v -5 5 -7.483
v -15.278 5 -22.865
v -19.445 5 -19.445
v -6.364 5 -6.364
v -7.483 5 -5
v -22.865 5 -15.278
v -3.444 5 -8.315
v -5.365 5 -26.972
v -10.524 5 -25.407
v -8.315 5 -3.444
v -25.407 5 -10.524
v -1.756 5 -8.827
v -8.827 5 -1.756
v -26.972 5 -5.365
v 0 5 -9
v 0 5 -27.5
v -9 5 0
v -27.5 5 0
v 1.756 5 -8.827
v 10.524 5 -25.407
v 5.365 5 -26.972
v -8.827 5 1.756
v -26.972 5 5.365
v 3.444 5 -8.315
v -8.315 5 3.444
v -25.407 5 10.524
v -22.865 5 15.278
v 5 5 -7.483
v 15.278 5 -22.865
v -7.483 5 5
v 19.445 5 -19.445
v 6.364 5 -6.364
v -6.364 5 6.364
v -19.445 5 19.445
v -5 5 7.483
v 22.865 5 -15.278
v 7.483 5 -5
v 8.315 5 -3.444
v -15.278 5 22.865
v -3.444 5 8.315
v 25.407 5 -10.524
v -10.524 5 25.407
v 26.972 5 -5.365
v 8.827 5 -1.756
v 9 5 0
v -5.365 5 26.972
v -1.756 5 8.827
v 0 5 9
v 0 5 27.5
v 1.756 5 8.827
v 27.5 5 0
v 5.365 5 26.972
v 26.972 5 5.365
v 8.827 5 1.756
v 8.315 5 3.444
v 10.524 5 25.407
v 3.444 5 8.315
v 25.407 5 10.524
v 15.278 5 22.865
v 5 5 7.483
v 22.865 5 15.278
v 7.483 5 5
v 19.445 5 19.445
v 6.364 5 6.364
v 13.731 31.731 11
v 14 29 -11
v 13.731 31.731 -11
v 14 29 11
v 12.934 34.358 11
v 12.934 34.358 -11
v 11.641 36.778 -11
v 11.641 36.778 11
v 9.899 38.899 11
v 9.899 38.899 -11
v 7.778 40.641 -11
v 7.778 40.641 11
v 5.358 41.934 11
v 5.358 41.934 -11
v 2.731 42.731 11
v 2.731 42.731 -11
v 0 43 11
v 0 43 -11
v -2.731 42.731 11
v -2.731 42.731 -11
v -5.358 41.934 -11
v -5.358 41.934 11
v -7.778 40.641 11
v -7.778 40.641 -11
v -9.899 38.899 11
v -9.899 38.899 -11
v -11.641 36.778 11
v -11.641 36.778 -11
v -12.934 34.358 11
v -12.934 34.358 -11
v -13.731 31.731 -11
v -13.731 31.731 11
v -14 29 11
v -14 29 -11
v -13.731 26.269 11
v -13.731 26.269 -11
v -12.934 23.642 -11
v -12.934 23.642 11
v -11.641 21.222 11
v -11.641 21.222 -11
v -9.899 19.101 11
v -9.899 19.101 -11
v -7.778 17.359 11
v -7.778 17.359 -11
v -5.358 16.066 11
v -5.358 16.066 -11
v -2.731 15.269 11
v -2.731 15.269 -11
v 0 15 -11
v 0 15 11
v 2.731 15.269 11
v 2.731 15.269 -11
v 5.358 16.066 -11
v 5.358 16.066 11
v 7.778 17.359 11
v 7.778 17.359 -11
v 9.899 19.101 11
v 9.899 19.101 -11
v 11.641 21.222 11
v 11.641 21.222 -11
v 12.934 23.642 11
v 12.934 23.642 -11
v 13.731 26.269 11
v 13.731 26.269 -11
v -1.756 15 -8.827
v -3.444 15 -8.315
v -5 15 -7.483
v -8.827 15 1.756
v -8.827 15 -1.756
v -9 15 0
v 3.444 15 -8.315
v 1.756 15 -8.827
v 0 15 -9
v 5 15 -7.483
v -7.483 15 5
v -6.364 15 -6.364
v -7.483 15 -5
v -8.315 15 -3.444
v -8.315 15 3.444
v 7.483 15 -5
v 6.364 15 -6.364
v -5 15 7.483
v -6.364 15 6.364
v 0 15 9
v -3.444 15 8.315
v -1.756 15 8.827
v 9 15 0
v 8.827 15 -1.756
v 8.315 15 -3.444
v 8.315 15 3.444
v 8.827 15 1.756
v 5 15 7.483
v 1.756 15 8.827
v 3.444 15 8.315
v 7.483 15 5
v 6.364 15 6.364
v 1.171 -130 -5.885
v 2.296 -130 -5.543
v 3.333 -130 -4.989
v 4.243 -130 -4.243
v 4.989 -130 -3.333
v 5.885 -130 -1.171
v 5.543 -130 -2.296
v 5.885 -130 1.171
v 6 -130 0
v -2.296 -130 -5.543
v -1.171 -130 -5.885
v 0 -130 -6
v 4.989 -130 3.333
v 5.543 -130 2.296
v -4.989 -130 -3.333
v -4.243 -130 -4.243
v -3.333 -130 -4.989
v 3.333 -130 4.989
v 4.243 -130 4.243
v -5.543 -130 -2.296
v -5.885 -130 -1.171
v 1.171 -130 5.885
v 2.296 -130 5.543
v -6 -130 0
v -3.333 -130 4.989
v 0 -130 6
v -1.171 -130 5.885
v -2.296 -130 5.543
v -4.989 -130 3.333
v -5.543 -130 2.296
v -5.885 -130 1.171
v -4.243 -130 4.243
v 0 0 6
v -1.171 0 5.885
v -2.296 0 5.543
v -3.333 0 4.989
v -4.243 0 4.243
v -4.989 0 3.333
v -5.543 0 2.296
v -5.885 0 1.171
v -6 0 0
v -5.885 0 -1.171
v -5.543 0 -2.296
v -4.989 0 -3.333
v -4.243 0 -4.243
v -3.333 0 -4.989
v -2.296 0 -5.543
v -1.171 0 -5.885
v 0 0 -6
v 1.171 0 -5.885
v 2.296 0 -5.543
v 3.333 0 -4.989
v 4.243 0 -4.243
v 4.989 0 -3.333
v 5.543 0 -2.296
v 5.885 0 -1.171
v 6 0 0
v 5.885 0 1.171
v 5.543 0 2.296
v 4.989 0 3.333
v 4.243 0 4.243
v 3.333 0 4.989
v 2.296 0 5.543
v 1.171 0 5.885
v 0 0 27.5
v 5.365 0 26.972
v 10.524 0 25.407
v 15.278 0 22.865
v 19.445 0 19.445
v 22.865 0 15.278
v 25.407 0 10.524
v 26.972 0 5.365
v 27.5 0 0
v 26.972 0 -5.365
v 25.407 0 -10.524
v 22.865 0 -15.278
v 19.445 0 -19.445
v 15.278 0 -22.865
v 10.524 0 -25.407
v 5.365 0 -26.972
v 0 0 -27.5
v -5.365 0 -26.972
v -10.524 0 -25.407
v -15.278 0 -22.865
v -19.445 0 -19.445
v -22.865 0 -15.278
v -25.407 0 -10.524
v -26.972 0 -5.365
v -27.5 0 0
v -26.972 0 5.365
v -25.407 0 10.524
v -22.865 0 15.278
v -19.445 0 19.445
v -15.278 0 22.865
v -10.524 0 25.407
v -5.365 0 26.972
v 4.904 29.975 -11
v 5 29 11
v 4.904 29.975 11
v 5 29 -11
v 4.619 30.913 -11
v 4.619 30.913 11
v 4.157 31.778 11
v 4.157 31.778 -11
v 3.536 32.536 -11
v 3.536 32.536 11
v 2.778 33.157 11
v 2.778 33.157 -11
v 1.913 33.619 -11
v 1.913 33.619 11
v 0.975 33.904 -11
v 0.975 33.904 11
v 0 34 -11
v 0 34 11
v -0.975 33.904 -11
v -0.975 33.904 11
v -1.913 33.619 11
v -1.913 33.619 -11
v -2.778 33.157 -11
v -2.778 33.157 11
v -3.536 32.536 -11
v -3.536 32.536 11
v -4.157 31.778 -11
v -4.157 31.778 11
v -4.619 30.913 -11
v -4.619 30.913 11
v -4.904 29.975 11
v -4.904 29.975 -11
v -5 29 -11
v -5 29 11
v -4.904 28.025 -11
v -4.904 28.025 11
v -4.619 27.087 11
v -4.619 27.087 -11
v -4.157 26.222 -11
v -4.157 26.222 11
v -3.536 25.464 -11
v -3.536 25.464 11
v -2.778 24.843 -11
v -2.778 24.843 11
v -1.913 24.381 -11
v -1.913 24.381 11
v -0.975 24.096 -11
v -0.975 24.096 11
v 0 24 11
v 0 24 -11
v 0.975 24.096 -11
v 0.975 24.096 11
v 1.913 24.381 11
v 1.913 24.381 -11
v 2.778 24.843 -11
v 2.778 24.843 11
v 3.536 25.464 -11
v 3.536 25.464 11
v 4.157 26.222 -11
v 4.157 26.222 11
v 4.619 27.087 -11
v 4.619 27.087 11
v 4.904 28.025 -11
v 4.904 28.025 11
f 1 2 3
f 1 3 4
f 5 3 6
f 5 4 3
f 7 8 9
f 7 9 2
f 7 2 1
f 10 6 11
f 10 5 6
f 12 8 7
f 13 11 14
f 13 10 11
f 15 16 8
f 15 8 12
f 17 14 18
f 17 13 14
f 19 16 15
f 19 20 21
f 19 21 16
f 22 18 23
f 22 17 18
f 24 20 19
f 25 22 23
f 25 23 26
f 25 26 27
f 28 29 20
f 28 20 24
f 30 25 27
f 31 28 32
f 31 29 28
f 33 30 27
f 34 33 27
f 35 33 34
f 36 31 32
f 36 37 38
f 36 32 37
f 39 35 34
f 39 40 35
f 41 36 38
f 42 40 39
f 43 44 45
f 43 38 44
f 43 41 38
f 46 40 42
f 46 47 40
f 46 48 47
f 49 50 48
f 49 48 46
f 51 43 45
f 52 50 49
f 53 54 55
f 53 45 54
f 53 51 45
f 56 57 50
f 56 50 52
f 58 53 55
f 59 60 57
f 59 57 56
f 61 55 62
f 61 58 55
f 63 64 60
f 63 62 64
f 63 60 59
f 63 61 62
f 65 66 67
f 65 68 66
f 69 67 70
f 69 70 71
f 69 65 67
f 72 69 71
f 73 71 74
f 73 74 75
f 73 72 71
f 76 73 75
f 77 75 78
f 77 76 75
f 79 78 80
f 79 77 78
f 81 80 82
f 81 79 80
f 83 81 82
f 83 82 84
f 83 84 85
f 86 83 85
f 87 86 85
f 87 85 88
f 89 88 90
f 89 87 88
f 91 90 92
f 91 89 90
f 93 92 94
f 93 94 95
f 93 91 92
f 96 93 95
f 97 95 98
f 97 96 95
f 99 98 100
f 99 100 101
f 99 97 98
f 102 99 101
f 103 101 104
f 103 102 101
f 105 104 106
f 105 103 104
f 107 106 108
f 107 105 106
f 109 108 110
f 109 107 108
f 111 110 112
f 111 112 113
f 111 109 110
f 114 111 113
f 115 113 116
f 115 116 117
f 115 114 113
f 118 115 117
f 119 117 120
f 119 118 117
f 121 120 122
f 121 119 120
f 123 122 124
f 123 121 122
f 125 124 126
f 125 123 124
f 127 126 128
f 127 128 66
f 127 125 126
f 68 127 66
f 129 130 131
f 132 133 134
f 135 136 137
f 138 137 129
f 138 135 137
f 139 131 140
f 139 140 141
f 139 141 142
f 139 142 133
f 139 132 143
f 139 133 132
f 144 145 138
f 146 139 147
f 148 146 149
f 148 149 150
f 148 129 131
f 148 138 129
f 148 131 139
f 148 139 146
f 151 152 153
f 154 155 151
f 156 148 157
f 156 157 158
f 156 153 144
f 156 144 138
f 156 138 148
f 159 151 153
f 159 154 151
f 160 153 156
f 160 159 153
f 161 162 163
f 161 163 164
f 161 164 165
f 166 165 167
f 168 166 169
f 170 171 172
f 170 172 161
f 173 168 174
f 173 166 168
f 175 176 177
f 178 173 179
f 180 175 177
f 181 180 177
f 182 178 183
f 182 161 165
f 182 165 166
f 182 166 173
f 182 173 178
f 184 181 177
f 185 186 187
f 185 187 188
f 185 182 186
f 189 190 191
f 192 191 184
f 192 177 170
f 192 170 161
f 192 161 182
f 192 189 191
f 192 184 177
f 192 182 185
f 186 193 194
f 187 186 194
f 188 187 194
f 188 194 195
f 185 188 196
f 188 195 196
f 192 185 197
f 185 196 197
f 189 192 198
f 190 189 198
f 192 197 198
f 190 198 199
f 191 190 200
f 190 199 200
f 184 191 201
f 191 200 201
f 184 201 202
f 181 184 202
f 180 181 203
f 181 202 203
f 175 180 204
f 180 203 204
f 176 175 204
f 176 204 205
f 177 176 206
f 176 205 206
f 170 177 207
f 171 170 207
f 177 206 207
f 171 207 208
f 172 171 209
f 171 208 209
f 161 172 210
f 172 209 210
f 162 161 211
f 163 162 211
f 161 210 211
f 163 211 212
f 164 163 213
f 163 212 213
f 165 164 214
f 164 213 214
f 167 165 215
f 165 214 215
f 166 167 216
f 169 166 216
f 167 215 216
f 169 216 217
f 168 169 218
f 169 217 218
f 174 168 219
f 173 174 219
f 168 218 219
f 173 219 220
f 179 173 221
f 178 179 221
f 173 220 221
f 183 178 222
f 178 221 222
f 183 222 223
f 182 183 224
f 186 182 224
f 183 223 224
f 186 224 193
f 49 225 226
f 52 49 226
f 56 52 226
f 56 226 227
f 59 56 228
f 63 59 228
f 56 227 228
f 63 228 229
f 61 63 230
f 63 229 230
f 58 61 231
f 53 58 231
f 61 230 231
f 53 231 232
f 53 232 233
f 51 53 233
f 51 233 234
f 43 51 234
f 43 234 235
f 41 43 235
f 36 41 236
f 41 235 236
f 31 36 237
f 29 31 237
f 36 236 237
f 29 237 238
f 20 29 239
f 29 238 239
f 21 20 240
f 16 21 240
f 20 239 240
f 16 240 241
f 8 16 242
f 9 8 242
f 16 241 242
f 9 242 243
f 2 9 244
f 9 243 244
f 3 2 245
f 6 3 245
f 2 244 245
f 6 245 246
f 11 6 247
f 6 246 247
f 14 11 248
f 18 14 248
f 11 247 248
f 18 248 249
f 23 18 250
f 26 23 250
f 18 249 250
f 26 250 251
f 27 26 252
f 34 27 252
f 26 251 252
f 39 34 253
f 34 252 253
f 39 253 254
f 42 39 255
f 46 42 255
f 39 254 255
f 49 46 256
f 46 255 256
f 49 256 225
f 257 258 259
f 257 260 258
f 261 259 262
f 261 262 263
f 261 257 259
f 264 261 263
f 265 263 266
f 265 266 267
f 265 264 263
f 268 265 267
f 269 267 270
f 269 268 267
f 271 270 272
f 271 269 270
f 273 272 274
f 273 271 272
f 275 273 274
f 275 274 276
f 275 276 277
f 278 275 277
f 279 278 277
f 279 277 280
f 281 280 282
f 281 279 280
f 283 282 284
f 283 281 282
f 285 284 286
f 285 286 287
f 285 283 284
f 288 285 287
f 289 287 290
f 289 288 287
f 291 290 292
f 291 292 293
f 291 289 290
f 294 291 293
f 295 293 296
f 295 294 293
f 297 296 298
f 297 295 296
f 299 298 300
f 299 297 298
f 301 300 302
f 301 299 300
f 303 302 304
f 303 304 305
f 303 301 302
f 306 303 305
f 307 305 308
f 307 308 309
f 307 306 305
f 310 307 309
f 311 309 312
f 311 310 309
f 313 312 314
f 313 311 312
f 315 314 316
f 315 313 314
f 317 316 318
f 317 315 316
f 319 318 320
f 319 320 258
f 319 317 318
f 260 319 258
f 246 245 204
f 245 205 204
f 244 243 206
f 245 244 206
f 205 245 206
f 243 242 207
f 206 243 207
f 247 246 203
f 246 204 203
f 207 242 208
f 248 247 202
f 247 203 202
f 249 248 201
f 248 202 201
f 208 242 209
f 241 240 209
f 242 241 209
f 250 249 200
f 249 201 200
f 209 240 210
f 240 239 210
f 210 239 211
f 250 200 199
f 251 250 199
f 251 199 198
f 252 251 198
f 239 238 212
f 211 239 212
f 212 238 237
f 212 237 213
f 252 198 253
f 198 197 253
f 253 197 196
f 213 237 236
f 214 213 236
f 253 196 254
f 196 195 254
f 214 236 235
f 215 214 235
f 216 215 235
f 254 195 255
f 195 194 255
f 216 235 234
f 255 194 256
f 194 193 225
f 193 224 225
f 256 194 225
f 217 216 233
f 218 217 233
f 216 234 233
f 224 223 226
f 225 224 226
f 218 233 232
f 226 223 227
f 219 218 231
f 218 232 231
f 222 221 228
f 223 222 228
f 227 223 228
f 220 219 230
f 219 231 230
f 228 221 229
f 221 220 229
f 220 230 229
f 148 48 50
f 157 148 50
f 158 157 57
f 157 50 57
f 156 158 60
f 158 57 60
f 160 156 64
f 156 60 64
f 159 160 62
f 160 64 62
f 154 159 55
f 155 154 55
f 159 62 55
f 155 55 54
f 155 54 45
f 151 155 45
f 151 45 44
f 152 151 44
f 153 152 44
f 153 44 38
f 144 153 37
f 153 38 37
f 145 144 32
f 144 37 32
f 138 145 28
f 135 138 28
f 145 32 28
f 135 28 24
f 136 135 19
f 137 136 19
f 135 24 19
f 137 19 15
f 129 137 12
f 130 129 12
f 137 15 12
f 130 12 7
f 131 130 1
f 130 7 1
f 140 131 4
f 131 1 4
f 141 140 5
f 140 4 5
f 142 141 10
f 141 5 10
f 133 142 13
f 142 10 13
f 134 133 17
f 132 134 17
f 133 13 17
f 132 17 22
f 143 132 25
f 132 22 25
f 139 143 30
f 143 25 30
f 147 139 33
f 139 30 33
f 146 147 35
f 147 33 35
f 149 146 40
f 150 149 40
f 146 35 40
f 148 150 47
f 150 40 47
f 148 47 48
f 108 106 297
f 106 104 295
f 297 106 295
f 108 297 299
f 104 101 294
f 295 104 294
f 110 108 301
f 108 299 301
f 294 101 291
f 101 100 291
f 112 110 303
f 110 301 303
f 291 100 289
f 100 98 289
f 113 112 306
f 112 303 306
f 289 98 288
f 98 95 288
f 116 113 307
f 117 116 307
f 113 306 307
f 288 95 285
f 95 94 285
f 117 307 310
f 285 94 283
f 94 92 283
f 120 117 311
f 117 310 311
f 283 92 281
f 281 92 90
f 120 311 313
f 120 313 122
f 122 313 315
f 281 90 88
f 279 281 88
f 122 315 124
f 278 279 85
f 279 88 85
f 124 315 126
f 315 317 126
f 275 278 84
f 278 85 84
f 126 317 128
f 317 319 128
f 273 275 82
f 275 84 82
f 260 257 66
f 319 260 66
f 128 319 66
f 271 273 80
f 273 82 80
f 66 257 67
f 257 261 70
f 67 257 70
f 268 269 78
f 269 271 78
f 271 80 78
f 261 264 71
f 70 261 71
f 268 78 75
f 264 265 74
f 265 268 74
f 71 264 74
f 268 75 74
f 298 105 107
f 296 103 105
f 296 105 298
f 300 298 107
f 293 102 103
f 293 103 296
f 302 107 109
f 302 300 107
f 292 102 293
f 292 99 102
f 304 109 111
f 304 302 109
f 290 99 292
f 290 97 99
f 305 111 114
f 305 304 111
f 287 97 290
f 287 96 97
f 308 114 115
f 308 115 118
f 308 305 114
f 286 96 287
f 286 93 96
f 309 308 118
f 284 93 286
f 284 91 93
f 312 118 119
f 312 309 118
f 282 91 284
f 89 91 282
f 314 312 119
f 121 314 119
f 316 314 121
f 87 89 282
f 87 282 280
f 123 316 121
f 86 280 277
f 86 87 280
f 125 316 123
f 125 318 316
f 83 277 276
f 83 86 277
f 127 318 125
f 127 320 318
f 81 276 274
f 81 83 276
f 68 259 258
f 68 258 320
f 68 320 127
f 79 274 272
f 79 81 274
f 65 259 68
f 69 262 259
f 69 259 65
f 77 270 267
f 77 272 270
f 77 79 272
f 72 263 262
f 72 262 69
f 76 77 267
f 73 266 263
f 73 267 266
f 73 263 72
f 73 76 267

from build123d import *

# Parameters (mm, degrees)
SKETCH_1_R      = 27.5
EXTRUDE_1_DEPTH = 5
SKETCH_2_R      = 9
EXTRUDE_2_DEPTH = 10
SKETCH_3_R      = 14
SKETCH_3_R_2    = 5
EXTRUDE_3_DEPTH = 11
SKETCH_4_R      = 6
EXTRUDE_4_DEPTH = 130


with BuildPart() as part:
    # Эскиз1 → Бобышка-Вытянуть1 (new body)
    with BuildSketch(Plane(origin=(0, 0, 0), x_dir=(1, 0, 0), z_dir=(0, 1, 0))):
        with Locations(Location((0, 0, 0), (0, 0, 270))):
            Circle(SKETCH_1_R)
    extrude(amount=EXTRUDE_1_DEPTH)

    # Эскиз2 → Бобышка-Вытянуть2 (add)
    with BuildSketch(Plane(origin=(0, 5, 0), x_dir=(1, 0, 0), z_dir=(0, 1, 0))):
        with Locations(Location((0, 0, 0), (0, 0, 270))):
            Circle(SKETCH_2_R)
    extrude(amount=EXTRUDE_2_DEPTH)

    # Эскиз4 → Бобышка-Вытянуть4 (add)
    with BuildSketch(Plane.XZ):
        with Locations(Location((0, 0, 0), (0, 0, 90))):
            Circle(SKETCH_4_R)
    extrude(amount=EXTRUDE_4_DEPTH)


with BuildPart() as body_2:
    # Эскиз3 → Бобышка-Вытянуть3 (new, symmetric)
    with BuildSketch(Plane.XY):
        with Locations((0, 29)):
            Circle(SKETCH_3_R)
        with Locations((0, 29)):
            Circle(SKETCH_3_R_2, mode=Mode.SUBTRACT)
    extrude(amount=EXTRUDE_3_DEPTH, both=True)


solid = Compound([part.part, body_2.part])
